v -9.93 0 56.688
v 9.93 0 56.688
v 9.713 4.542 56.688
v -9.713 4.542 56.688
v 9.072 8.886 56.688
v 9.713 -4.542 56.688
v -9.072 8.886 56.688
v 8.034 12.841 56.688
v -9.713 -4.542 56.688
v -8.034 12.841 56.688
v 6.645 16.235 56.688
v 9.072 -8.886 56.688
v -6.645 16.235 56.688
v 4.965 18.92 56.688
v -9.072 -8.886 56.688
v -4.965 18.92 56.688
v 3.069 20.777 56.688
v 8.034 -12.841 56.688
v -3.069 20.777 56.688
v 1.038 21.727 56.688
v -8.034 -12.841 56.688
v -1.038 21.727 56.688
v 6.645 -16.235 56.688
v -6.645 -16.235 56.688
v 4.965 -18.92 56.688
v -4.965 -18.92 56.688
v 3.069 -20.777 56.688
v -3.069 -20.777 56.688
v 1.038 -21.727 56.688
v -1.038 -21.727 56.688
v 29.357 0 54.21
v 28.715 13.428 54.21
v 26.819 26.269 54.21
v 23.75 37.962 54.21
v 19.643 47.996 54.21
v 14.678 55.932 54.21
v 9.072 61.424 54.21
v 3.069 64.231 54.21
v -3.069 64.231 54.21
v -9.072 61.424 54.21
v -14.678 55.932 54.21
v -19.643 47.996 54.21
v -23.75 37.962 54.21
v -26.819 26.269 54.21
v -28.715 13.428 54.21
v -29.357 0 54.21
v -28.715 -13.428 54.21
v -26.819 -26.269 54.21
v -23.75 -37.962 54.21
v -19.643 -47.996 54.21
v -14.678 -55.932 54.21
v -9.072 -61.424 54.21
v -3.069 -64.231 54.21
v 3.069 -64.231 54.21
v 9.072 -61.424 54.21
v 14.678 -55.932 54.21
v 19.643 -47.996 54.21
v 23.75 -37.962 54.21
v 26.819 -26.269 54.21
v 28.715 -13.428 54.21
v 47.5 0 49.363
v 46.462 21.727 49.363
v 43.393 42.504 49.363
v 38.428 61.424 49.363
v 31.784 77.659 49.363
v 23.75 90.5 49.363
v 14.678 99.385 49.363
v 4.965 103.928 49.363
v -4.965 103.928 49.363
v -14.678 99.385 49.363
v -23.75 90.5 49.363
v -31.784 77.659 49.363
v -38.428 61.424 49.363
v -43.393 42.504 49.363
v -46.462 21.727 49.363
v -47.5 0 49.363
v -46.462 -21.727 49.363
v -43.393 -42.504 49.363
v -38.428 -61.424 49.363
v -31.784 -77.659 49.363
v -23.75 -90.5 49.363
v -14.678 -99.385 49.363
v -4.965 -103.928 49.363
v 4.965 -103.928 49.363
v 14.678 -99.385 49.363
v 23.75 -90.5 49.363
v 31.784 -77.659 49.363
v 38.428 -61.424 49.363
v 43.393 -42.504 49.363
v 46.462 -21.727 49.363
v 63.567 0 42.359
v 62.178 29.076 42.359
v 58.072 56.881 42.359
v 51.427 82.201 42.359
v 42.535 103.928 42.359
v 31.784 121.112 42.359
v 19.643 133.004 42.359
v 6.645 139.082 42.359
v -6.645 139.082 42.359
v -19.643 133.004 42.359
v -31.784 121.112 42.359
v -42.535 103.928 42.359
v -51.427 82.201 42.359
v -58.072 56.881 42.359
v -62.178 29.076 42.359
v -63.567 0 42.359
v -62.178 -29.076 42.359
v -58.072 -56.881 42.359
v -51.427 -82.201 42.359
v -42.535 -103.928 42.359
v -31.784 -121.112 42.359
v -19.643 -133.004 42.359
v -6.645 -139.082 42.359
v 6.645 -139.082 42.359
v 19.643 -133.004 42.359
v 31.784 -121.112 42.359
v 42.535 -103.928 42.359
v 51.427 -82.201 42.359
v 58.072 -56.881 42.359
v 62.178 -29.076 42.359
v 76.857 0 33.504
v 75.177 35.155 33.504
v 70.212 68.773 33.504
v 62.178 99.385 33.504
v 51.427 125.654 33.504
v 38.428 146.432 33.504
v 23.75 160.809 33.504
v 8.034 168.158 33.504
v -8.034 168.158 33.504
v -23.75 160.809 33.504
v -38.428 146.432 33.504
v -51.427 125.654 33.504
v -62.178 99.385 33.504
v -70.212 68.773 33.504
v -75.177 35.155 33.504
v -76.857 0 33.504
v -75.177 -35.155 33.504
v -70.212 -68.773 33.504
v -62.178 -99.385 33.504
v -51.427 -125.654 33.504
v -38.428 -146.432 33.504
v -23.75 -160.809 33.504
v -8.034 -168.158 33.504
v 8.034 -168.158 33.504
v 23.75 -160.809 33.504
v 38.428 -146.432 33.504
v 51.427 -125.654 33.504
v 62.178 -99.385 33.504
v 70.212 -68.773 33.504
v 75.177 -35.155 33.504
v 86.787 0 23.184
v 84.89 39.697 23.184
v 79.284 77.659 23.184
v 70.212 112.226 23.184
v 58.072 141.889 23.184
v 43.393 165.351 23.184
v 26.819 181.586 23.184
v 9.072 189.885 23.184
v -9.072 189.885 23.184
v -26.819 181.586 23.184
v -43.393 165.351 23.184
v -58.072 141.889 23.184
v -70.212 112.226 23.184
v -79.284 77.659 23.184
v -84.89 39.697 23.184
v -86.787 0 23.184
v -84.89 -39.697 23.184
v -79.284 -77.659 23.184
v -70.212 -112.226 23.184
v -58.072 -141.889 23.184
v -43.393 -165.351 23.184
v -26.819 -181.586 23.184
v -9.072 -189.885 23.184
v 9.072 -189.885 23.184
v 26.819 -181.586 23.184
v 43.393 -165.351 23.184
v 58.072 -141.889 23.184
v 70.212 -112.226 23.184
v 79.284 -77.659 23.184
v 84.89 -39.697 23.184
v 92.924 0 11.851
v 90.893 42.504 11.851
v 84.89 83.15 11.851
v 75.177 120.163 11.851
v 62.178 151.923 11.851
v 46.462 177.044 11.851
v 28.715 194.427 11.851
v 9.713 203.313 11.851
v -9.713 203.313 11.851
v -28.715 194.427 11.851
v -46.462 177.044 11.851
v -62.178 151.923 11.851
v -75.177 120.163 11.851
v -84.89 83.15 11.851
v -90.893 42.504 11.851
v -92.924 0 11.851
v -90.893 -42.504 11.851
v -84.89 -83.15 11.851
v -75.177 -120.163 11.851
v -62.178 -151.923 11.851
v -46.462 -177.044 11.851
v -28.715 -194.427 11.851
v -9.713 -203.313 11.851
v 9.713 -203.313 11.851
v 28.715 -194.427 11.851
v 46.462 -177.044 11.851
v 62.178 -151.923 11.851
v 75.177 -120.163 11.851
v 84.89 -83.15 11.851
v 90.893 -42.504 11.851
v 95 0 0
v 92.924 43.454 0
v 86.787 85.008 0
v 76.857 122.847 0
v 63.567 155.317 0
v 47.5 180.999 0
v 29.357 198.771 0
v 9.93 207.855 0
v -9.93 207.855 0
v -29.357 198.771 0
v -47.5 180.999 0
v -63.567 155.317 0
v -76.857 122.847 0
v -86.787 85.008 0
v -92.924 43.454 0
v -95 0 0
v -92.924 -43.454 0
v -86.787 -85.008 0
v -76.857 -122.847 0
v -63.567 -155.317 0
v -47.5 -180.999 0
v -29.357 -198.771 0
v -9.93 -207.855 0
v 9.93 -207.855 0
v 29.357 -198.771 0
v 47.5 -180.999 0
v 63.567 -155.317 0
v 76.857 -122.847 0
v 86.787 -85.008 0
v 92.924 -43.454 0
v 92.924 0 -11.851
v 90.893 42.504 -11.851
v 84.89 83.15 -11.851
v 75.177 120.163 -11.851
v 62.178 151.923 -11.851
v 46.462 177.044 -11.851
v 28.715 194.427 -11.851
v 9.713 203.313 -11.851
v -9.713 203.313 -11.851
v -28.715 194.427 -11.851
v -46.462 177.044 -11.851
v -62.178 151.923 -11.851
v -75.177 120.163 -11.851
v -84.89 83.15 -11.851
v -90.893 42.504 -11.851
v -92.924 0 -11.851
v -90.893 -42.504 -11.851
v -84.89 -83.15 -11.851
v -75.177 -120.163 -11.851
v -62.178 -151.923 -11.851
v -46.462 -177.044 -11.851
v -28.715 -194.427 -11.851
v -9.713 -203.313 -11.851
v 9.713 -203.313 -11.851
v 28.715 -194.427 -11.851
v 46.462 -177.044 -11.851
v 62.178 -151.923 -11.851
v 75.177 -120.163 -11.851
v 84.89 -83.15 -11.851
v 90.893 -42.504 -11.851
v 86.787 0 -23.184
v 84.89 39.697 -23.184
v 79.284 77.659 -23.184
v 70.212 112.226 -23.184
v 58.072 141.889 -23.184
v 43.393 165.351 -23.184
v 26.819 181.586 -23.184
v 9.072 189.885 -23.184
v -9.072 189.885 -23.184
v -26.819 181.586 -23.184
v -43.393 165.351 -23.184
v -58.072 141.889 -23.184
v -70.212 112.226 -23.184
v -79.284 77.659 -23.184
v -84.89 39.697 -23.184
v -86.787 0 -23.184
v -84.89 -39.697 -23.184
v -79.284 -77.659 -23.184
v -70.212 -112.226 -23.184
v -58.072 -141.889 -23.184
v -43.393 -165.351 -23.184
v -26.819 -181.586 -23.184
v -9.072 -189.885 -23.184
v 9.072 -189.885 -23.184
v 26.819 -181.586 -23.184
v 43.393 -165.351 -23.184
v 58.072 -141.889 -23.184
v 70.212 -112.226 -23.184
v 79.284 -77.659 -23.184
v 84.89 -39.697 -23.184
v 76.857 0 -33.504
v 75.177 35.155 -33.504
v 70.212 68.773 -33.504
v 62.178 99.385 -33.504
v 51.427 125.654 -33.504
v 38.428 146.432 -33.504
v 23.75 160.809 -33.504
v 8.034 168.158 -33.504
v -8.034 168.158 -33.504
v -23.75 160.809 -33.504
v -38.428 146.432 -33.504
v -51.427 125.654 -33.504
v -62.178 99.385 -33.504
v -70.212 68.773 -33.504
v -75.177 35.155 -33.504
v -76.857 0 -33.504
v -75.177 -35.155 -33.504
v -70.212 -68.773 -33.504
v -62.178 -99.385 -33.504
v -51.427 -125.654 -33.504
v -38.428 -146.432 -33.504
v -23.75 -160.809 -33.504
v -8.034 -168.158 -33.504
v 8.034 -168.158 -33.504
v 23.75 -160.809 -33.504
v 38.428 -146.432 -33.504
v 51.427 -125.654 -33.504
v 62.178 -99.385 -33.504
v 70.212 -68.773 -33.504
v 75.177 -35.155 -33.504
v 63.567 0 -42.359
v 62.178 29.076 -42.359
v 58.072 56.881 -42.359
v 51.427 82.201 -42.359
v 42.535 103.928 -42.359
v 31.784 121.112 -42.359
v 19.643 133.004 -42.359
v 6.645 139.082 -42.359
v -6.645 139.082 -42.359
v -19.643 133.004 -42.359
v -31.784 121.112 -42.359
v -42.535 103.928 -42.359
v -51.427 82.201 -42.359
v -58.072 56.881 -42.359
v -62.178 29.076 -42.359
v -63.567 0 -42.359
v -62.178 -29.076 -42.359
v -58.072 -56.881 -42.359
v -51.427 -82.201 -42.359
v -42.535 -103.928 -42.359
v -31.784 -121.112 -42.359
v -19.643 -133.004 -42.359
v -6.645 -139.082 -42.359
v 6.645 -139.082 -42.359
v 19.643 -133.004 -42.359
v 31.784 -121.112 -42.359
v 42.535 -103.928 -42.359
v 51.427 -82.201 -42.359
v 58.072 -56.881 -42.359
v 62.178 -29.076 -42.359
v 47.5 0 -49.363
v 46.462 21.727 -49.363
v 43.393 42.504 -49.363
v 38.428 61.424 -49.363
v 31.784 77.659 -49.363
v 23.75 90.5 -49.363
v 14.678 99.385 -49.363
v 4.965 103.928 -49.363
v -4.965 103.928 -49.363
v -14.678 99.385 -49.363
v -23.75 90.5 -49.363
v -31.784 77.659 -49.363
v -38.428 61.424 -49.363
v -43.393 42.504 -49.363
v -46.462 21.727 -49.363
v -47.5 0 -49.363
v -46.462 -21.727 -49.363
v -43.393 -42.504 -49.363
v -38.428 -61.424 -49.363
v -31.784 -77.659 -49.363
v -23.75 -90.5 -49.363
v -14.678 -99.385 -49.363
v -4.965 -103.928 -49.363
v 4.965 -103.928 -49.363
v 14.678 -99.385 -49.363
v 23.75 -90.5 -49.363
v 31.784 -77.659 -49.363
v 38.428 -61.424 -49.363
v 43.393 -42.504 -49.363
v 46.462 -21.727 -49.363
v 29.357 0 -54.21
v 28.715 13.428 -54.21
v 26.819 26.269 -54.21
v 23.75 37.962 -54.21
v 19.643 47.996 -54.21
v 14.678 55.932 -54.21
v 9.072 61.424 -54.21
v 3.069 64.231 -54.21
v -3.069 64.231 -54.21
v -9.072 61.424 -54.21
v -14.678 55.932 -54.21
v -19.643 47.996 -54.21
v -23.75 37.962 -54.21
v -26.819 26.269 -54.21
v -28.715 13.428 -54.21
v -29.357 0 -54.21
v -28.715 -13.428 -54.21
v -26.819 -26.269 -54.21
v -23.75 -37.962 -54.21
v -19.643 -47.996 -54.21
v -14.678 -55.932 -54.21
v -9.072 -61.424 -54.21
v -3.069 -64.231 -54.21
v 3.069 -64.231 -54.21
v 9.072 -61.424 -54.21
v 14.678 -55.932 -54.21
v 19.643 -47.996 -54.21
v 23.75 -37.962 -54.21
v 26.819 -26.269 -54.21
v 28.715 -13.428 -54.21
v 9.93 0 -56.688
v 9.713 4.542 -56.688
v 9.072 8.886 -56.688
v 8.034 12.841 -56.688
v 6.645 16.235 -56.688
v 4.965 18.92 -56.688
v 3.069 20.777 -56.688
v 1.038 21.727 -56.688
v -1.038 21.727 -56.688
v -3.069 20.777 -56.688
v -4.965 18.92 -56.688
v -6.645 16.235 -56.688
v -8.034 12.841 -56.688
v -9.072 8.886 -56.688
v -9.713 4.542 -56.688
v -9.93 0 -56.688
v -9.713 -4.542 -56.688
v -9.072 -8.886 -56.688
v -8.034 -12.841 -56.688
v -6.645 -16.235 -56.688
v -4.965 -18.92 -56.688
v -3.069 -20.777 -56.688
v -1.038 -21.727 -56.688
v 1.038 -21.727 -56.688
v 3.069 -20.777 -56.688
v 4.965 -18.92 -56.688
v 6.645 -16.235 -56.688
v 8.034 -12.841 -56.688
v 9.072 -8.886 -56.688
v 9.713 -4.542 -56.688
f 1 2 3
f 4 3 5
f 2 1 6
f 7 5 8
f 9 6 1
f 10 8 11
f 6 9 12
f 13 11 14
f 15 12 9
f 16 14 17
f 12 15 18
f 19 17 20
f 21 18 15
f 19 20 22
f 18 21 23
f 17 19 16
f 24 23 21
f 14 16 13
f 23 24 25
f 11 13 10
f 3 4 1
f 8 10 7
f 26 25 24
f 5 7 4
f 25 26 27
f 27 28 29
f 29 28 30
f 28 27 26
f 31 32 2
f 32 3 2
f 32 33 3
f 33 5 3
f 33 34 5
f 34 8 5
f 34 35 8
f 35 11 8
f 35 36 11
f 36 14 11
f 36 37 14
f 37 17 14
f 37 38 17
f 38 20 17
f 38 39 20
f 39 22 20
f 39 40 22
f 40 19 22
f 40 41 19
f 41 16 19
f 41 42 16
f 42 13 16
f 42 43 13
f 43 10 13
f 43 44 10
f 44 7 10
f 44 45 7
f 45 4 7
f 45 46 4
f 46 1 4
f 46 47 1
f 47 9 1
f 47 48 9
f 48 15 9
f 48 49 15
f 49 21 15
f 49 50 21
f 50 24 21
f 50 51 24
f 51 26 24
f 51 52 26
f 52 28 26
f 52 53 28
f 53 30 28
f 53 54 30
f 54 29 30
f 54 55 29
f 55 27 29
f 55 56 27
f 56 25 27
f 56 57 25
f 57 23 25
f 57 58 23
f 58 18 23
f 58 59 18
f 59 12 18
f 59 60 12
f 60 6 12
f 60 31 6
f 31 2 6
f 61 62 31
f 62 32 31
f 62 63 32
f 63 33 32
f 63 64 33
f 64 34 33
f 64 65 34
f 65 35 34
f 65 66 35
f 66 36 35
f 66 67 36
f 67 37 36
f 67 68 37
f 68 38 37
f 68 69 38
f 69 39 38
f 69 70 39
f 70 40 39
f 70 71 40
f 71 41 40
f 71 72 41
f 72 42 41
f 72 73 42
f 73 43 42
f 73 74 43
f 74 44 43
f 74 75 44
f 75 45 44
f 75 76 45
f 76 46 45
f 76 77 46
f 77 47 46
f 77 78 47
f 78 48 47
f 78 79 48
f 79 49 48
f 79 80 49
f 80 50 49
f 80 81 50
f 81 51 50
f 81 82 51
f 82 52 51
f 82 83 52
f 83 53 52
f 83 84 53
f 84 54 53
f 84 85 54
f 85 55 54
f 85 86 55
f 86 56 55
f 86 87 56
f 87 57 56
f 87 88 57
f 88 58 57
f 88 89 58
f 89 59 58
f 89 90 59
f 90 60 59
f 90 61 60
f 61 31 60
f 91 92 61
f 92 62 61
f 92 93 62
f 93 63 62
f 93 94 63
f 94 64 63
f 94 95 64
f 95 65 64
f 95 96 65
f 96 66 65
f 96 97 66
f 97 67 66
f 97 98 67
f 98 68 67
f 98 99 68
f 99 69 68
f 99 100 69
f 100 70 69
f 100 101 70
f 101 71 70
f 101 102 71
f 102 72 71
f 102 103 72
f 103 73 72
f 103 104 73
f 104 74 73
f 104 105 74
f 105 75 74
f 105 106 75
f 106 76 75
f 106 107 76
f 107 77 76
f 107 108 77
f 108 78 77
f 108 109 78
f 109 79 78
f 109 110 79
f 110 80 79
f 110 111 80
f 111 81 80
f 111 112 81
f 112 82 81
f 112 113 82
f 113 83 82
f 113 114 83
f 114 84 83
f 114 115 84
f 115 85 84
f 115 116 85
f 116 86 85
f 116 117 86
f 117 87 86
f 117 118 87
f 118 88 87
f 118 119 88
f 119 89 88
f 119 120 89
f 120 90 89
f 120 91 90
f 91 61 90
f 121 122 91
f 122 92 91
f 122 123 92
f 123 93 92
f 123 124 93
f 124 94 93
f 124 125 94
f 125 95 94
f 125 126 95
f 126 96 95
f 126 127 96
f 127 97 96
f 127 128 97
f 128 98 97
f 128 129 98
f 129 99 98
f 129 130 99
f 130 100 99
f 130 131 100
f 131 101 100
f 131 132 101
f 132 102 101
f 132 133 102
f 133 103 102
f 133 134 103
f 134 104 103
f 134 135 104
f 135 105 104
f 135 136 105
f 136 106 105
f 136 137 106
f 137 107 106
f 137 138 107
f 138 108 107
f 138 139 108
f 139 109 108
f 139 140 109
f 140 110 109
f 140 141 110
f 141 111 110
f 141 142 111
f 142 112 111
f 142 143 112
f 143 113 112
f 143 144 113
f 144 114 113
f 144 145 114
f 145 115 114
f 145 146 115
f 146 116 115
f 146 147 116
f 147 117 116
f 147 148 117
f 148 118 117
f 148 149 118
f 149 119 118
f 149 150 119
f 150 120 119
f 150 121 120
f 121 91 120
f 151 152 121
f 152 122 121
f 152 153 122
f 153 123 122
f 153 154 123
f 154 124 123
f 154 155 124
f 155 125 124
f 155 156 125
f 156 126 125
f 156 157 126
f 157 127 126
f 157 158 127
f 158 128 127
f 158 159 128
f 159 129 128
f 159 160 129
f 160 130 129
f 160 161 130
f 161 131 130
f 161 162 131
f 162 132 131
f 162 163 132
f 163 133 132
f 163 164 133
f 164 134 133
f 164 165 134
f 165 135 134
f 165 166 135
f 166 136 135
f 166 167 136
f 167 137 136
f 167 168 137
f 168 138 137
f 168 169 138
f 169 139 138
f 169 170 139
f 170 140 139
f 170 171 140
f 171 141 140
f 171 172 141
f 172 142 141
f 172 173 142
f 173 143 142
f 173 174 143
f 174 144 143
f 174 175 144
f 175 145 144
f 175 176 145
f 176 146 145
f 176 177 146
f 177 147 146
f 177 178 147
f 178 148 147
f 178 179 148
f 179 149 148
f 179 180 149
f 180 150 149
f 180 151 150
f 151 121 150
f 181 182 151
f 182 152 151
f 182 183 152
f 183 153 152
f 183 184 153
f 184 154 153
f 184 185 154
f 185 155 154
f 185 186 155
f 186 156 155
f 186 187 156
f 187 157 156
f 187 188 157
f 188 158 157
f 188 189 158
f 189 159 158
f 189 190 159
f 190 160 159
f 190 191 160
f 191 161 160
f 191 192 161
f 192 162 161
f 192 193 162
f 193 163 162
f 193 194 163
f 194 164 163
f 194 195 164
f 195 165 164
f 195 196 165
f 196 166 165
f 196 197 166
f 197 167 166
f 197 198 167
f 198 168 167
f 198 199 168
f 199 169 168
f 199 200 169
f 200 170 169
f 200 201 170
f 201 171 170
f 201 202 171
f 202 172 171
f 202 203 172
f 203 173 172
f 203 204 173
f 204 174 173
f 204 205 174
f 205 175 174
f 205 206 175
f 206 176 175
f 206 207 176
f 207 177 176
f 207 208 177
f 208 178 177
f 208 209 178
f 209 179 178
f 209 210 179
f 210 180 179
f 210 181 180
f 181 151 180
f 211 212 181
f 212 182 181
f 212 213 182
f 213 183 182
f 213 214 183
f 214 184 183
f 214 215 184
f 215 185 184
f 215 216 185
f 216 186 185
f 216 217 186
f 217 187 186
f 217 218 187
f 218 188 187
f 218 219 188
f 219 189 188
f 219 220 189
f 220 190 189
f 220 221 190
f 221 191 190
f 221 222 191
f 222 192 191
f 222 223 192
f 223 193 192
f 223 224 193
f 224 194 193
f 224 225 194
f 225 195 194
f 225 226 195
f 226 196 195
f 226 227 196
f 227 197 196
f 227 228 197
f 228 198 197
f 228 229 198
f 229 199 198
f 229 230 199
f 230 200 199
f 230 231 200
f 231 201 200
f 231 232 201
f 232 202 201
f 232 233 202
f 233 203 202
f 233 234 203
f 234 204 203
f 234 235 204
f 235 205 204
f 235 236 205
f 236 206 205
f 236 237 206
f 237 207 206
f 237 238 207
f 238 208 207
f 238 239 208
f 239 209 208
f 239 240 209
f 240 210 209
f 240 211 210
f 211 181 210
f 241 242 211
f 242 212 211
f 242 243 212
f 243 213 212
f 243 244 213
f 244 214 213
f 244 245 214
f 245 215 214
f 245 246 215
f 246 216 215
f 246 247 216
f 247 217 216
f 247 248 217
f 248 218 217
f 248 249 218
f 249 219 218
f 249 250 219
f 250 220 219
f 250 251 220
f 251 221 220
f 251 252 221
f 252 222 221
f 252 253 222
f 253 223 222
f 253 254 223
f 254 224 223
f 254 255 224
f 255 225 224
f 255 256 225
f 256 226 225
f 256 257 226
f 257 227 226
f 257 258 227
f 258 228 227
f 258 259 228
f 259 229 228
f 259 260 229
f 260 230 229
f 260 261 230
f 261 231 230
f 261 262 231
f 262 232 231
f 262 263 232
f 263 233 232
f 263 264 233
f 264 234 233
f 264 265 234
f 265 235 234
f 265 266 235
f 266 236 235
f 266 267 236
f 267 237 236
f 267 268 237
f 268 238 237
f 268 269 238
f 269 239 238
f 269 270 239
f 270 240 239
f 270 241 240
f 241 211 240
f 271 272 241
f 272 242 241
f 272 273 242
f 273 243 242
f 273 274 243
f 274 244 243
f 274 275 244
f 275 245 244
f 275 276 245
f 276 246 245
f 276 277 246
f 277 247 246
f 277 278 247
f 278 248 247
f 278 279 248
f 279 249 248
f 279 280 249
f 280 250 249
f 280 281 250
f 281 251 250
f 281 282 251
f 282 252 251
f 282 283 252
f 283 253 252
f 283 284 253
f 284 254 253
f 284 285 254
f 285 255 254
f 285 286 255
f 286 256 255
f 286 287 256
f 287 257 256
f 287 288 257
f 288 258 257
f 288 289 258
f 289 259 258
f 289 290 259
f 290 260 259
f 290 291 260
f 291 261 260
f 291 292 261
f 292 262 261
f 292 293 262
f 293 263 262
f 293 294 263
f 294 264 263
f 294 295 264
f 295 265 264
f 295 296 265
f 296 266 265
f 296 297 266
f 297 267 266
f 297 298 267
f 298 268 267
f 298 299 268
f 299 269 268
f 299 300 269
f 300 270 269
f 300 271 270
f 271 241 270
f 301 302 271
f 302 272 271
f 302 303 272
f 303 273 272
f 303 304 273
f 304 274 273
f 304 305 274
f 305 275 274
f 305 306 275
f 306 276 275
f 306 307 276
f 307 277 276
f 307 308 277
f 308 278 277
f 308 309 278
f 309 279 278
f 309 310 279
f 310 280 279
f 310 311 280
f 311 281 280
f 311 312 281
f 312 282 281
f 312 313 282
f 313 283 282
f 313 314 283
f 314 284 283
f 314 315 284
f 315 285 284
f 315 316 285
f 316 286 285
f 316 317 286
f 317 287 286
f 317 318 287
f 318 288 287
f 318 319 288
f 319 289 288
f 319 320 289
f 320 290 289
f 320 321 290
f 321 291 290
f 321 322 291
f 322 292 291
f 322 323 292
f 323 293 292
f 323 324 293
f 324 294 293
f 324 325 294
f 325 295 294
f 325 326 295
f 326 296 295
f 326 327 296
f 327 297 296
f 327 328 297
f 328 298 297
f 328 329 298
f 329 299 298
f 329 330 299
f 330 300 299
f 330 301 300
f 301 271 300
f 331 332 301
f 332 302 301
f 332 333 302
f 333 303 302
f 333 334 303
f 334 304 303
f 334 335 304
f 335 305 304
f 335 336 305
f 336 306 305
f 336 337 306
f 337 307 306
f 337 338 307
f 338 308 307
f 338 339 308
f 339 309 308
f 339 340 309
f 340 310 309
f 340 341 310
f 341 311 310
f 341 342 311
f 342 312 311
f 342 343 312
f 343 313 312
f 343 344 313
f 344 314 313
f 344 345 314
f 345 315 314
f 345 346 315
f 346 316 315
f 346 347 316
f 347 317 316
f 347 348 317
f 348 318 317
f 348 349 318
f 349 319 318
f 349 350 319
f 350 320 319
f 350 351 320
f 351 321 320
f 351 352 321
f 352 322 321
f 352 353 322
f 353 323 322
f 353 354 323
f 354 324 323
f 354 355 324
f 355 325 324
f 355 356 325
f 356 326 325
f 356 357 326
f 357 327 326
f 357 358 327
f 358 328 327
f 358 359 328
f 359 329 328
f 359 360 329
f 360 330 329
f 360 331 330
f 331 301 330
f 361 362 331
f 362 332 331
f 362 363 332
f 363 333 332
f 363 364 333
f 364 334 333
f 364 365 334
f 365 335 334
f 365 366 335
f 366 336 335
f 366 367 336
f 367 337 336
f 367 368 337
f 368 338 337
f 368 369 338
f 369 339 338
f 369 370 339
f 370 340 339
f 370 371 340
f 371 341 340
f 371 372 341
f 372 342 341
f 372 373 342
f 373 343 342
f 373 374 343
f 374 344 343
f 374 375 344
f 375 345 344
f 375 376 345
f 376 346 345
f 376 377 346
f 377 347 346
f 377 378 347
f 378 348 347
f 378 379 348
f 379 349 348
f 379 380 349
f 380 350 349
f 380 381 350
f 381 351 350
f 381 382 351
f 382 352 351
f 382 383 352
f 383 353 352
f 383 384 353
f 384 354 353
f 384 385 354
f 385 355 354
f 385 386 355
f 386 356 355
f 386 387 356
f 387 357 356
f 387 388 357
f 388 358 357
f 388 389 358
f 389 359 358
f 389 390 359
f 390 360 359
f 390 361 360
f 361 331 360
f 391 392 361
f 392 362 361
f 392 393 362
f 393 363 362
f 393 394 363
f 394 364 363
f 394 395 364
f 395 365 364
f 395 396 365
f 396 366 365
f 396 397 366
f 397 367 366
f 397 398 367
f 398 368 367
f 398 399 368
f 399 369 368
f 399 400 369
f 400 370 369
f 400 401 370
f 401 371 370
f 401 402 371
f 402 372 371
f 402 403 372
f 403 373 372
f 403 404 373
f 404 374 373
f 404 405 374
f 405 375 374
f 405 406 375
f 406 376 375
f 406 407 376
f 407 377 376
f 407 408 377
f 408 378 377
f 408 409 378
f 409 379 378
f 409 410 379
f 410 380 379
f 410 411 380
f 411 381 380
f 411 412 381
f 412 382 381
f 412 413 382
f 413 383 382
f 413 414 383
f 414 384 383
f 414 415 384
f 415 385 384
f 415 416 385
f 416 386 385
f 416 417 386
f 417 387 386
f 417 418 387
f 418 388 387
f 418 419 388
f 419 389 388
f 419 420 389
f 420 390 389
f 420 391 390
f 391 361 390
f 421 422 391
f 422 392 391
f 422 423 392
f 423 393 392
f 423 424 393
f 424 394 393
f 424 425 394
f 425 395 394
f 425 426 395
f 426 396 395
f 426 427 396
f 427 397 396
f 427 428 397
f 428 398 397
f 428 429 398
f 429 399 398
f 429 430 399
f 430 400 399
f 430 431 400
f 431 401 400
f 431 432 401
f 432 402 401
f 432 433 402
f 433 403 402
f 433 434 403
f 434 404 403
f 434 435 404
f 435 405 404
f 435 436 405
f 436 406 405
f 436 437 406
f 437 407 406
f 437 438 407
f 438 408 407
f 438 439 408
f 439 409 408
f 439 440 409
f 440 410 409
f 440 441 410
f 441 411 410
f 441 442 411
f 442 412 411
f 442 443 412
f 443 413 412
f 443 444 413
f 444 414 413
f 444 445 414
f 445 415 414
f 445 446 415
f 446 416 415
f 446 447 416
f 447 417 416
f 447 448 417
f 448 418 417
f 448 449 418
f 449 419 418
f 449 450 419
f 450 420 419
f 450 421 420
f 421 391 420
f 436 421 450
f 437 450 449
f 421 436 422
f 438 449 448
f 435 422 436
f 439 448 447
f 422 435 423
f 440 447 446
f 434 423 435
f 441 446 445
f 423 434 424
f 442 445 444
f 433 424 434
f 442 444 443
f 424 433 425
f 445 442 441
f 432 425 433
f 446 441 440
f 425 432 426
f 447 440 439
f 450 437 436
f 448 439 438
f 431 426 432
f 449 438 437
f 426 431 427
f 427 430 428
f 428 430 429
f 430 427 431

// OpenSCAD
// Generated by SolidPython 1.0.1 on 2020-07-29 00:46:46


scale(v = [5, 11, 3]) {
	sphere(r = 19);
}
/***********************************************
*********      SolidPython code:      **********
************************************************
 
# import packages: SolidPython
from solid import *
from solid.utils import *
from itertools import chain, combinations, permutations


class Resize:

    def __init__(self, scad_file):
        self.scad_file = scad_file
        #self.scad_file = import_scad(scad_file)
        # cone/cylinder param:
        self.r1 = 0
        self.r2 = 0
        self.h = 0
        # rectangular prism param:
        self.w = 0
        self.l = 0
        # ellipse param:
        self.r = 0

    # import OpenScad code (file name corresponds to shape)


    # classify shape + parameters
    def assign(self, param1, param2, param3):
        if self.scad_file == 'cone.scad':
            self.r1 = param1
            self.r2 = param2
            self.h = param3
        elif self.scad_file == 'cylinder.scad':
            self.r1 = param1
            self.r2 = param2
            self.h = param3
        elif self.scad_file == 'rectangularPrism.scad':
            self.h = param1
            self.l = param2
            self.w = param3
        else:
            self.r = param1
            self.h = param2

    # resize parameters
    def iterate(self):
        x = range(3, 20, 2)
        i = 1
        if self.scad_file == 'cone.scad':
            tempList = list(permutations(x, 2))
            for temp in tempList:
                param1 = temp[0]
                param2 = temp[1]
                filepath = 'produced_scad_files/' + 'cone' + str(param1) + '_' + str(param2) + '_' + '.scad'
                scad_render_to_file(cylinder(h=param1, r1=param2, r2=0), filepath)

        elif self.scad_file == 'cylinder.scad':
            tempList = list(permutations(x, 3))
            for temp in tempList:
                param1 = temp[0]
                param2 = temp[1]
                filepath = 'produced_scad_files/' + 'cylinder' + str(param1) + '_' + str(param2) + '_' + '.scad'
                scad_render_to_file(cylinder(h=param1, r1=param2, r2=param2), filepath)

        elif self.scad_file == 'rectangularPrism.scad':
            tempList = list(permutations(x, 3))
            for temp in tempList:
                param1 = temp[0]
                param2 = temp[1]
                param3 = temp[2]
                filepath = 'produced_scad_files/' + 'rectangularPrism' + str(param1) + '_' + str(param2) + '_' + str(
                    param3) + '.scad'
                scad_render_to_file(cube(size=(param1, param2, param3)), filepath)

        elif self.scad_file == 'ellipse.scad':
            tempList = list(permutations(x, 4))
            for temp in tempList:
                param1 = temp[0]
                param2 = temp[1]
                param3 = temp[2]
                param4 = temp[3]
                filepath = 'produced_scad_files/' + 'ellipse' + str(param1) + '_' + str(param2) + '_' + str(param3) + '_' + str(param4) + '.scad'
                scad_render_to_file(scale([param1, param2, param3])(sphere(r=param4)), filepath)

    def render_to_scadfile(self):
        scad_render_to_file(scad, 'example.scad') 
 
************************************************/
